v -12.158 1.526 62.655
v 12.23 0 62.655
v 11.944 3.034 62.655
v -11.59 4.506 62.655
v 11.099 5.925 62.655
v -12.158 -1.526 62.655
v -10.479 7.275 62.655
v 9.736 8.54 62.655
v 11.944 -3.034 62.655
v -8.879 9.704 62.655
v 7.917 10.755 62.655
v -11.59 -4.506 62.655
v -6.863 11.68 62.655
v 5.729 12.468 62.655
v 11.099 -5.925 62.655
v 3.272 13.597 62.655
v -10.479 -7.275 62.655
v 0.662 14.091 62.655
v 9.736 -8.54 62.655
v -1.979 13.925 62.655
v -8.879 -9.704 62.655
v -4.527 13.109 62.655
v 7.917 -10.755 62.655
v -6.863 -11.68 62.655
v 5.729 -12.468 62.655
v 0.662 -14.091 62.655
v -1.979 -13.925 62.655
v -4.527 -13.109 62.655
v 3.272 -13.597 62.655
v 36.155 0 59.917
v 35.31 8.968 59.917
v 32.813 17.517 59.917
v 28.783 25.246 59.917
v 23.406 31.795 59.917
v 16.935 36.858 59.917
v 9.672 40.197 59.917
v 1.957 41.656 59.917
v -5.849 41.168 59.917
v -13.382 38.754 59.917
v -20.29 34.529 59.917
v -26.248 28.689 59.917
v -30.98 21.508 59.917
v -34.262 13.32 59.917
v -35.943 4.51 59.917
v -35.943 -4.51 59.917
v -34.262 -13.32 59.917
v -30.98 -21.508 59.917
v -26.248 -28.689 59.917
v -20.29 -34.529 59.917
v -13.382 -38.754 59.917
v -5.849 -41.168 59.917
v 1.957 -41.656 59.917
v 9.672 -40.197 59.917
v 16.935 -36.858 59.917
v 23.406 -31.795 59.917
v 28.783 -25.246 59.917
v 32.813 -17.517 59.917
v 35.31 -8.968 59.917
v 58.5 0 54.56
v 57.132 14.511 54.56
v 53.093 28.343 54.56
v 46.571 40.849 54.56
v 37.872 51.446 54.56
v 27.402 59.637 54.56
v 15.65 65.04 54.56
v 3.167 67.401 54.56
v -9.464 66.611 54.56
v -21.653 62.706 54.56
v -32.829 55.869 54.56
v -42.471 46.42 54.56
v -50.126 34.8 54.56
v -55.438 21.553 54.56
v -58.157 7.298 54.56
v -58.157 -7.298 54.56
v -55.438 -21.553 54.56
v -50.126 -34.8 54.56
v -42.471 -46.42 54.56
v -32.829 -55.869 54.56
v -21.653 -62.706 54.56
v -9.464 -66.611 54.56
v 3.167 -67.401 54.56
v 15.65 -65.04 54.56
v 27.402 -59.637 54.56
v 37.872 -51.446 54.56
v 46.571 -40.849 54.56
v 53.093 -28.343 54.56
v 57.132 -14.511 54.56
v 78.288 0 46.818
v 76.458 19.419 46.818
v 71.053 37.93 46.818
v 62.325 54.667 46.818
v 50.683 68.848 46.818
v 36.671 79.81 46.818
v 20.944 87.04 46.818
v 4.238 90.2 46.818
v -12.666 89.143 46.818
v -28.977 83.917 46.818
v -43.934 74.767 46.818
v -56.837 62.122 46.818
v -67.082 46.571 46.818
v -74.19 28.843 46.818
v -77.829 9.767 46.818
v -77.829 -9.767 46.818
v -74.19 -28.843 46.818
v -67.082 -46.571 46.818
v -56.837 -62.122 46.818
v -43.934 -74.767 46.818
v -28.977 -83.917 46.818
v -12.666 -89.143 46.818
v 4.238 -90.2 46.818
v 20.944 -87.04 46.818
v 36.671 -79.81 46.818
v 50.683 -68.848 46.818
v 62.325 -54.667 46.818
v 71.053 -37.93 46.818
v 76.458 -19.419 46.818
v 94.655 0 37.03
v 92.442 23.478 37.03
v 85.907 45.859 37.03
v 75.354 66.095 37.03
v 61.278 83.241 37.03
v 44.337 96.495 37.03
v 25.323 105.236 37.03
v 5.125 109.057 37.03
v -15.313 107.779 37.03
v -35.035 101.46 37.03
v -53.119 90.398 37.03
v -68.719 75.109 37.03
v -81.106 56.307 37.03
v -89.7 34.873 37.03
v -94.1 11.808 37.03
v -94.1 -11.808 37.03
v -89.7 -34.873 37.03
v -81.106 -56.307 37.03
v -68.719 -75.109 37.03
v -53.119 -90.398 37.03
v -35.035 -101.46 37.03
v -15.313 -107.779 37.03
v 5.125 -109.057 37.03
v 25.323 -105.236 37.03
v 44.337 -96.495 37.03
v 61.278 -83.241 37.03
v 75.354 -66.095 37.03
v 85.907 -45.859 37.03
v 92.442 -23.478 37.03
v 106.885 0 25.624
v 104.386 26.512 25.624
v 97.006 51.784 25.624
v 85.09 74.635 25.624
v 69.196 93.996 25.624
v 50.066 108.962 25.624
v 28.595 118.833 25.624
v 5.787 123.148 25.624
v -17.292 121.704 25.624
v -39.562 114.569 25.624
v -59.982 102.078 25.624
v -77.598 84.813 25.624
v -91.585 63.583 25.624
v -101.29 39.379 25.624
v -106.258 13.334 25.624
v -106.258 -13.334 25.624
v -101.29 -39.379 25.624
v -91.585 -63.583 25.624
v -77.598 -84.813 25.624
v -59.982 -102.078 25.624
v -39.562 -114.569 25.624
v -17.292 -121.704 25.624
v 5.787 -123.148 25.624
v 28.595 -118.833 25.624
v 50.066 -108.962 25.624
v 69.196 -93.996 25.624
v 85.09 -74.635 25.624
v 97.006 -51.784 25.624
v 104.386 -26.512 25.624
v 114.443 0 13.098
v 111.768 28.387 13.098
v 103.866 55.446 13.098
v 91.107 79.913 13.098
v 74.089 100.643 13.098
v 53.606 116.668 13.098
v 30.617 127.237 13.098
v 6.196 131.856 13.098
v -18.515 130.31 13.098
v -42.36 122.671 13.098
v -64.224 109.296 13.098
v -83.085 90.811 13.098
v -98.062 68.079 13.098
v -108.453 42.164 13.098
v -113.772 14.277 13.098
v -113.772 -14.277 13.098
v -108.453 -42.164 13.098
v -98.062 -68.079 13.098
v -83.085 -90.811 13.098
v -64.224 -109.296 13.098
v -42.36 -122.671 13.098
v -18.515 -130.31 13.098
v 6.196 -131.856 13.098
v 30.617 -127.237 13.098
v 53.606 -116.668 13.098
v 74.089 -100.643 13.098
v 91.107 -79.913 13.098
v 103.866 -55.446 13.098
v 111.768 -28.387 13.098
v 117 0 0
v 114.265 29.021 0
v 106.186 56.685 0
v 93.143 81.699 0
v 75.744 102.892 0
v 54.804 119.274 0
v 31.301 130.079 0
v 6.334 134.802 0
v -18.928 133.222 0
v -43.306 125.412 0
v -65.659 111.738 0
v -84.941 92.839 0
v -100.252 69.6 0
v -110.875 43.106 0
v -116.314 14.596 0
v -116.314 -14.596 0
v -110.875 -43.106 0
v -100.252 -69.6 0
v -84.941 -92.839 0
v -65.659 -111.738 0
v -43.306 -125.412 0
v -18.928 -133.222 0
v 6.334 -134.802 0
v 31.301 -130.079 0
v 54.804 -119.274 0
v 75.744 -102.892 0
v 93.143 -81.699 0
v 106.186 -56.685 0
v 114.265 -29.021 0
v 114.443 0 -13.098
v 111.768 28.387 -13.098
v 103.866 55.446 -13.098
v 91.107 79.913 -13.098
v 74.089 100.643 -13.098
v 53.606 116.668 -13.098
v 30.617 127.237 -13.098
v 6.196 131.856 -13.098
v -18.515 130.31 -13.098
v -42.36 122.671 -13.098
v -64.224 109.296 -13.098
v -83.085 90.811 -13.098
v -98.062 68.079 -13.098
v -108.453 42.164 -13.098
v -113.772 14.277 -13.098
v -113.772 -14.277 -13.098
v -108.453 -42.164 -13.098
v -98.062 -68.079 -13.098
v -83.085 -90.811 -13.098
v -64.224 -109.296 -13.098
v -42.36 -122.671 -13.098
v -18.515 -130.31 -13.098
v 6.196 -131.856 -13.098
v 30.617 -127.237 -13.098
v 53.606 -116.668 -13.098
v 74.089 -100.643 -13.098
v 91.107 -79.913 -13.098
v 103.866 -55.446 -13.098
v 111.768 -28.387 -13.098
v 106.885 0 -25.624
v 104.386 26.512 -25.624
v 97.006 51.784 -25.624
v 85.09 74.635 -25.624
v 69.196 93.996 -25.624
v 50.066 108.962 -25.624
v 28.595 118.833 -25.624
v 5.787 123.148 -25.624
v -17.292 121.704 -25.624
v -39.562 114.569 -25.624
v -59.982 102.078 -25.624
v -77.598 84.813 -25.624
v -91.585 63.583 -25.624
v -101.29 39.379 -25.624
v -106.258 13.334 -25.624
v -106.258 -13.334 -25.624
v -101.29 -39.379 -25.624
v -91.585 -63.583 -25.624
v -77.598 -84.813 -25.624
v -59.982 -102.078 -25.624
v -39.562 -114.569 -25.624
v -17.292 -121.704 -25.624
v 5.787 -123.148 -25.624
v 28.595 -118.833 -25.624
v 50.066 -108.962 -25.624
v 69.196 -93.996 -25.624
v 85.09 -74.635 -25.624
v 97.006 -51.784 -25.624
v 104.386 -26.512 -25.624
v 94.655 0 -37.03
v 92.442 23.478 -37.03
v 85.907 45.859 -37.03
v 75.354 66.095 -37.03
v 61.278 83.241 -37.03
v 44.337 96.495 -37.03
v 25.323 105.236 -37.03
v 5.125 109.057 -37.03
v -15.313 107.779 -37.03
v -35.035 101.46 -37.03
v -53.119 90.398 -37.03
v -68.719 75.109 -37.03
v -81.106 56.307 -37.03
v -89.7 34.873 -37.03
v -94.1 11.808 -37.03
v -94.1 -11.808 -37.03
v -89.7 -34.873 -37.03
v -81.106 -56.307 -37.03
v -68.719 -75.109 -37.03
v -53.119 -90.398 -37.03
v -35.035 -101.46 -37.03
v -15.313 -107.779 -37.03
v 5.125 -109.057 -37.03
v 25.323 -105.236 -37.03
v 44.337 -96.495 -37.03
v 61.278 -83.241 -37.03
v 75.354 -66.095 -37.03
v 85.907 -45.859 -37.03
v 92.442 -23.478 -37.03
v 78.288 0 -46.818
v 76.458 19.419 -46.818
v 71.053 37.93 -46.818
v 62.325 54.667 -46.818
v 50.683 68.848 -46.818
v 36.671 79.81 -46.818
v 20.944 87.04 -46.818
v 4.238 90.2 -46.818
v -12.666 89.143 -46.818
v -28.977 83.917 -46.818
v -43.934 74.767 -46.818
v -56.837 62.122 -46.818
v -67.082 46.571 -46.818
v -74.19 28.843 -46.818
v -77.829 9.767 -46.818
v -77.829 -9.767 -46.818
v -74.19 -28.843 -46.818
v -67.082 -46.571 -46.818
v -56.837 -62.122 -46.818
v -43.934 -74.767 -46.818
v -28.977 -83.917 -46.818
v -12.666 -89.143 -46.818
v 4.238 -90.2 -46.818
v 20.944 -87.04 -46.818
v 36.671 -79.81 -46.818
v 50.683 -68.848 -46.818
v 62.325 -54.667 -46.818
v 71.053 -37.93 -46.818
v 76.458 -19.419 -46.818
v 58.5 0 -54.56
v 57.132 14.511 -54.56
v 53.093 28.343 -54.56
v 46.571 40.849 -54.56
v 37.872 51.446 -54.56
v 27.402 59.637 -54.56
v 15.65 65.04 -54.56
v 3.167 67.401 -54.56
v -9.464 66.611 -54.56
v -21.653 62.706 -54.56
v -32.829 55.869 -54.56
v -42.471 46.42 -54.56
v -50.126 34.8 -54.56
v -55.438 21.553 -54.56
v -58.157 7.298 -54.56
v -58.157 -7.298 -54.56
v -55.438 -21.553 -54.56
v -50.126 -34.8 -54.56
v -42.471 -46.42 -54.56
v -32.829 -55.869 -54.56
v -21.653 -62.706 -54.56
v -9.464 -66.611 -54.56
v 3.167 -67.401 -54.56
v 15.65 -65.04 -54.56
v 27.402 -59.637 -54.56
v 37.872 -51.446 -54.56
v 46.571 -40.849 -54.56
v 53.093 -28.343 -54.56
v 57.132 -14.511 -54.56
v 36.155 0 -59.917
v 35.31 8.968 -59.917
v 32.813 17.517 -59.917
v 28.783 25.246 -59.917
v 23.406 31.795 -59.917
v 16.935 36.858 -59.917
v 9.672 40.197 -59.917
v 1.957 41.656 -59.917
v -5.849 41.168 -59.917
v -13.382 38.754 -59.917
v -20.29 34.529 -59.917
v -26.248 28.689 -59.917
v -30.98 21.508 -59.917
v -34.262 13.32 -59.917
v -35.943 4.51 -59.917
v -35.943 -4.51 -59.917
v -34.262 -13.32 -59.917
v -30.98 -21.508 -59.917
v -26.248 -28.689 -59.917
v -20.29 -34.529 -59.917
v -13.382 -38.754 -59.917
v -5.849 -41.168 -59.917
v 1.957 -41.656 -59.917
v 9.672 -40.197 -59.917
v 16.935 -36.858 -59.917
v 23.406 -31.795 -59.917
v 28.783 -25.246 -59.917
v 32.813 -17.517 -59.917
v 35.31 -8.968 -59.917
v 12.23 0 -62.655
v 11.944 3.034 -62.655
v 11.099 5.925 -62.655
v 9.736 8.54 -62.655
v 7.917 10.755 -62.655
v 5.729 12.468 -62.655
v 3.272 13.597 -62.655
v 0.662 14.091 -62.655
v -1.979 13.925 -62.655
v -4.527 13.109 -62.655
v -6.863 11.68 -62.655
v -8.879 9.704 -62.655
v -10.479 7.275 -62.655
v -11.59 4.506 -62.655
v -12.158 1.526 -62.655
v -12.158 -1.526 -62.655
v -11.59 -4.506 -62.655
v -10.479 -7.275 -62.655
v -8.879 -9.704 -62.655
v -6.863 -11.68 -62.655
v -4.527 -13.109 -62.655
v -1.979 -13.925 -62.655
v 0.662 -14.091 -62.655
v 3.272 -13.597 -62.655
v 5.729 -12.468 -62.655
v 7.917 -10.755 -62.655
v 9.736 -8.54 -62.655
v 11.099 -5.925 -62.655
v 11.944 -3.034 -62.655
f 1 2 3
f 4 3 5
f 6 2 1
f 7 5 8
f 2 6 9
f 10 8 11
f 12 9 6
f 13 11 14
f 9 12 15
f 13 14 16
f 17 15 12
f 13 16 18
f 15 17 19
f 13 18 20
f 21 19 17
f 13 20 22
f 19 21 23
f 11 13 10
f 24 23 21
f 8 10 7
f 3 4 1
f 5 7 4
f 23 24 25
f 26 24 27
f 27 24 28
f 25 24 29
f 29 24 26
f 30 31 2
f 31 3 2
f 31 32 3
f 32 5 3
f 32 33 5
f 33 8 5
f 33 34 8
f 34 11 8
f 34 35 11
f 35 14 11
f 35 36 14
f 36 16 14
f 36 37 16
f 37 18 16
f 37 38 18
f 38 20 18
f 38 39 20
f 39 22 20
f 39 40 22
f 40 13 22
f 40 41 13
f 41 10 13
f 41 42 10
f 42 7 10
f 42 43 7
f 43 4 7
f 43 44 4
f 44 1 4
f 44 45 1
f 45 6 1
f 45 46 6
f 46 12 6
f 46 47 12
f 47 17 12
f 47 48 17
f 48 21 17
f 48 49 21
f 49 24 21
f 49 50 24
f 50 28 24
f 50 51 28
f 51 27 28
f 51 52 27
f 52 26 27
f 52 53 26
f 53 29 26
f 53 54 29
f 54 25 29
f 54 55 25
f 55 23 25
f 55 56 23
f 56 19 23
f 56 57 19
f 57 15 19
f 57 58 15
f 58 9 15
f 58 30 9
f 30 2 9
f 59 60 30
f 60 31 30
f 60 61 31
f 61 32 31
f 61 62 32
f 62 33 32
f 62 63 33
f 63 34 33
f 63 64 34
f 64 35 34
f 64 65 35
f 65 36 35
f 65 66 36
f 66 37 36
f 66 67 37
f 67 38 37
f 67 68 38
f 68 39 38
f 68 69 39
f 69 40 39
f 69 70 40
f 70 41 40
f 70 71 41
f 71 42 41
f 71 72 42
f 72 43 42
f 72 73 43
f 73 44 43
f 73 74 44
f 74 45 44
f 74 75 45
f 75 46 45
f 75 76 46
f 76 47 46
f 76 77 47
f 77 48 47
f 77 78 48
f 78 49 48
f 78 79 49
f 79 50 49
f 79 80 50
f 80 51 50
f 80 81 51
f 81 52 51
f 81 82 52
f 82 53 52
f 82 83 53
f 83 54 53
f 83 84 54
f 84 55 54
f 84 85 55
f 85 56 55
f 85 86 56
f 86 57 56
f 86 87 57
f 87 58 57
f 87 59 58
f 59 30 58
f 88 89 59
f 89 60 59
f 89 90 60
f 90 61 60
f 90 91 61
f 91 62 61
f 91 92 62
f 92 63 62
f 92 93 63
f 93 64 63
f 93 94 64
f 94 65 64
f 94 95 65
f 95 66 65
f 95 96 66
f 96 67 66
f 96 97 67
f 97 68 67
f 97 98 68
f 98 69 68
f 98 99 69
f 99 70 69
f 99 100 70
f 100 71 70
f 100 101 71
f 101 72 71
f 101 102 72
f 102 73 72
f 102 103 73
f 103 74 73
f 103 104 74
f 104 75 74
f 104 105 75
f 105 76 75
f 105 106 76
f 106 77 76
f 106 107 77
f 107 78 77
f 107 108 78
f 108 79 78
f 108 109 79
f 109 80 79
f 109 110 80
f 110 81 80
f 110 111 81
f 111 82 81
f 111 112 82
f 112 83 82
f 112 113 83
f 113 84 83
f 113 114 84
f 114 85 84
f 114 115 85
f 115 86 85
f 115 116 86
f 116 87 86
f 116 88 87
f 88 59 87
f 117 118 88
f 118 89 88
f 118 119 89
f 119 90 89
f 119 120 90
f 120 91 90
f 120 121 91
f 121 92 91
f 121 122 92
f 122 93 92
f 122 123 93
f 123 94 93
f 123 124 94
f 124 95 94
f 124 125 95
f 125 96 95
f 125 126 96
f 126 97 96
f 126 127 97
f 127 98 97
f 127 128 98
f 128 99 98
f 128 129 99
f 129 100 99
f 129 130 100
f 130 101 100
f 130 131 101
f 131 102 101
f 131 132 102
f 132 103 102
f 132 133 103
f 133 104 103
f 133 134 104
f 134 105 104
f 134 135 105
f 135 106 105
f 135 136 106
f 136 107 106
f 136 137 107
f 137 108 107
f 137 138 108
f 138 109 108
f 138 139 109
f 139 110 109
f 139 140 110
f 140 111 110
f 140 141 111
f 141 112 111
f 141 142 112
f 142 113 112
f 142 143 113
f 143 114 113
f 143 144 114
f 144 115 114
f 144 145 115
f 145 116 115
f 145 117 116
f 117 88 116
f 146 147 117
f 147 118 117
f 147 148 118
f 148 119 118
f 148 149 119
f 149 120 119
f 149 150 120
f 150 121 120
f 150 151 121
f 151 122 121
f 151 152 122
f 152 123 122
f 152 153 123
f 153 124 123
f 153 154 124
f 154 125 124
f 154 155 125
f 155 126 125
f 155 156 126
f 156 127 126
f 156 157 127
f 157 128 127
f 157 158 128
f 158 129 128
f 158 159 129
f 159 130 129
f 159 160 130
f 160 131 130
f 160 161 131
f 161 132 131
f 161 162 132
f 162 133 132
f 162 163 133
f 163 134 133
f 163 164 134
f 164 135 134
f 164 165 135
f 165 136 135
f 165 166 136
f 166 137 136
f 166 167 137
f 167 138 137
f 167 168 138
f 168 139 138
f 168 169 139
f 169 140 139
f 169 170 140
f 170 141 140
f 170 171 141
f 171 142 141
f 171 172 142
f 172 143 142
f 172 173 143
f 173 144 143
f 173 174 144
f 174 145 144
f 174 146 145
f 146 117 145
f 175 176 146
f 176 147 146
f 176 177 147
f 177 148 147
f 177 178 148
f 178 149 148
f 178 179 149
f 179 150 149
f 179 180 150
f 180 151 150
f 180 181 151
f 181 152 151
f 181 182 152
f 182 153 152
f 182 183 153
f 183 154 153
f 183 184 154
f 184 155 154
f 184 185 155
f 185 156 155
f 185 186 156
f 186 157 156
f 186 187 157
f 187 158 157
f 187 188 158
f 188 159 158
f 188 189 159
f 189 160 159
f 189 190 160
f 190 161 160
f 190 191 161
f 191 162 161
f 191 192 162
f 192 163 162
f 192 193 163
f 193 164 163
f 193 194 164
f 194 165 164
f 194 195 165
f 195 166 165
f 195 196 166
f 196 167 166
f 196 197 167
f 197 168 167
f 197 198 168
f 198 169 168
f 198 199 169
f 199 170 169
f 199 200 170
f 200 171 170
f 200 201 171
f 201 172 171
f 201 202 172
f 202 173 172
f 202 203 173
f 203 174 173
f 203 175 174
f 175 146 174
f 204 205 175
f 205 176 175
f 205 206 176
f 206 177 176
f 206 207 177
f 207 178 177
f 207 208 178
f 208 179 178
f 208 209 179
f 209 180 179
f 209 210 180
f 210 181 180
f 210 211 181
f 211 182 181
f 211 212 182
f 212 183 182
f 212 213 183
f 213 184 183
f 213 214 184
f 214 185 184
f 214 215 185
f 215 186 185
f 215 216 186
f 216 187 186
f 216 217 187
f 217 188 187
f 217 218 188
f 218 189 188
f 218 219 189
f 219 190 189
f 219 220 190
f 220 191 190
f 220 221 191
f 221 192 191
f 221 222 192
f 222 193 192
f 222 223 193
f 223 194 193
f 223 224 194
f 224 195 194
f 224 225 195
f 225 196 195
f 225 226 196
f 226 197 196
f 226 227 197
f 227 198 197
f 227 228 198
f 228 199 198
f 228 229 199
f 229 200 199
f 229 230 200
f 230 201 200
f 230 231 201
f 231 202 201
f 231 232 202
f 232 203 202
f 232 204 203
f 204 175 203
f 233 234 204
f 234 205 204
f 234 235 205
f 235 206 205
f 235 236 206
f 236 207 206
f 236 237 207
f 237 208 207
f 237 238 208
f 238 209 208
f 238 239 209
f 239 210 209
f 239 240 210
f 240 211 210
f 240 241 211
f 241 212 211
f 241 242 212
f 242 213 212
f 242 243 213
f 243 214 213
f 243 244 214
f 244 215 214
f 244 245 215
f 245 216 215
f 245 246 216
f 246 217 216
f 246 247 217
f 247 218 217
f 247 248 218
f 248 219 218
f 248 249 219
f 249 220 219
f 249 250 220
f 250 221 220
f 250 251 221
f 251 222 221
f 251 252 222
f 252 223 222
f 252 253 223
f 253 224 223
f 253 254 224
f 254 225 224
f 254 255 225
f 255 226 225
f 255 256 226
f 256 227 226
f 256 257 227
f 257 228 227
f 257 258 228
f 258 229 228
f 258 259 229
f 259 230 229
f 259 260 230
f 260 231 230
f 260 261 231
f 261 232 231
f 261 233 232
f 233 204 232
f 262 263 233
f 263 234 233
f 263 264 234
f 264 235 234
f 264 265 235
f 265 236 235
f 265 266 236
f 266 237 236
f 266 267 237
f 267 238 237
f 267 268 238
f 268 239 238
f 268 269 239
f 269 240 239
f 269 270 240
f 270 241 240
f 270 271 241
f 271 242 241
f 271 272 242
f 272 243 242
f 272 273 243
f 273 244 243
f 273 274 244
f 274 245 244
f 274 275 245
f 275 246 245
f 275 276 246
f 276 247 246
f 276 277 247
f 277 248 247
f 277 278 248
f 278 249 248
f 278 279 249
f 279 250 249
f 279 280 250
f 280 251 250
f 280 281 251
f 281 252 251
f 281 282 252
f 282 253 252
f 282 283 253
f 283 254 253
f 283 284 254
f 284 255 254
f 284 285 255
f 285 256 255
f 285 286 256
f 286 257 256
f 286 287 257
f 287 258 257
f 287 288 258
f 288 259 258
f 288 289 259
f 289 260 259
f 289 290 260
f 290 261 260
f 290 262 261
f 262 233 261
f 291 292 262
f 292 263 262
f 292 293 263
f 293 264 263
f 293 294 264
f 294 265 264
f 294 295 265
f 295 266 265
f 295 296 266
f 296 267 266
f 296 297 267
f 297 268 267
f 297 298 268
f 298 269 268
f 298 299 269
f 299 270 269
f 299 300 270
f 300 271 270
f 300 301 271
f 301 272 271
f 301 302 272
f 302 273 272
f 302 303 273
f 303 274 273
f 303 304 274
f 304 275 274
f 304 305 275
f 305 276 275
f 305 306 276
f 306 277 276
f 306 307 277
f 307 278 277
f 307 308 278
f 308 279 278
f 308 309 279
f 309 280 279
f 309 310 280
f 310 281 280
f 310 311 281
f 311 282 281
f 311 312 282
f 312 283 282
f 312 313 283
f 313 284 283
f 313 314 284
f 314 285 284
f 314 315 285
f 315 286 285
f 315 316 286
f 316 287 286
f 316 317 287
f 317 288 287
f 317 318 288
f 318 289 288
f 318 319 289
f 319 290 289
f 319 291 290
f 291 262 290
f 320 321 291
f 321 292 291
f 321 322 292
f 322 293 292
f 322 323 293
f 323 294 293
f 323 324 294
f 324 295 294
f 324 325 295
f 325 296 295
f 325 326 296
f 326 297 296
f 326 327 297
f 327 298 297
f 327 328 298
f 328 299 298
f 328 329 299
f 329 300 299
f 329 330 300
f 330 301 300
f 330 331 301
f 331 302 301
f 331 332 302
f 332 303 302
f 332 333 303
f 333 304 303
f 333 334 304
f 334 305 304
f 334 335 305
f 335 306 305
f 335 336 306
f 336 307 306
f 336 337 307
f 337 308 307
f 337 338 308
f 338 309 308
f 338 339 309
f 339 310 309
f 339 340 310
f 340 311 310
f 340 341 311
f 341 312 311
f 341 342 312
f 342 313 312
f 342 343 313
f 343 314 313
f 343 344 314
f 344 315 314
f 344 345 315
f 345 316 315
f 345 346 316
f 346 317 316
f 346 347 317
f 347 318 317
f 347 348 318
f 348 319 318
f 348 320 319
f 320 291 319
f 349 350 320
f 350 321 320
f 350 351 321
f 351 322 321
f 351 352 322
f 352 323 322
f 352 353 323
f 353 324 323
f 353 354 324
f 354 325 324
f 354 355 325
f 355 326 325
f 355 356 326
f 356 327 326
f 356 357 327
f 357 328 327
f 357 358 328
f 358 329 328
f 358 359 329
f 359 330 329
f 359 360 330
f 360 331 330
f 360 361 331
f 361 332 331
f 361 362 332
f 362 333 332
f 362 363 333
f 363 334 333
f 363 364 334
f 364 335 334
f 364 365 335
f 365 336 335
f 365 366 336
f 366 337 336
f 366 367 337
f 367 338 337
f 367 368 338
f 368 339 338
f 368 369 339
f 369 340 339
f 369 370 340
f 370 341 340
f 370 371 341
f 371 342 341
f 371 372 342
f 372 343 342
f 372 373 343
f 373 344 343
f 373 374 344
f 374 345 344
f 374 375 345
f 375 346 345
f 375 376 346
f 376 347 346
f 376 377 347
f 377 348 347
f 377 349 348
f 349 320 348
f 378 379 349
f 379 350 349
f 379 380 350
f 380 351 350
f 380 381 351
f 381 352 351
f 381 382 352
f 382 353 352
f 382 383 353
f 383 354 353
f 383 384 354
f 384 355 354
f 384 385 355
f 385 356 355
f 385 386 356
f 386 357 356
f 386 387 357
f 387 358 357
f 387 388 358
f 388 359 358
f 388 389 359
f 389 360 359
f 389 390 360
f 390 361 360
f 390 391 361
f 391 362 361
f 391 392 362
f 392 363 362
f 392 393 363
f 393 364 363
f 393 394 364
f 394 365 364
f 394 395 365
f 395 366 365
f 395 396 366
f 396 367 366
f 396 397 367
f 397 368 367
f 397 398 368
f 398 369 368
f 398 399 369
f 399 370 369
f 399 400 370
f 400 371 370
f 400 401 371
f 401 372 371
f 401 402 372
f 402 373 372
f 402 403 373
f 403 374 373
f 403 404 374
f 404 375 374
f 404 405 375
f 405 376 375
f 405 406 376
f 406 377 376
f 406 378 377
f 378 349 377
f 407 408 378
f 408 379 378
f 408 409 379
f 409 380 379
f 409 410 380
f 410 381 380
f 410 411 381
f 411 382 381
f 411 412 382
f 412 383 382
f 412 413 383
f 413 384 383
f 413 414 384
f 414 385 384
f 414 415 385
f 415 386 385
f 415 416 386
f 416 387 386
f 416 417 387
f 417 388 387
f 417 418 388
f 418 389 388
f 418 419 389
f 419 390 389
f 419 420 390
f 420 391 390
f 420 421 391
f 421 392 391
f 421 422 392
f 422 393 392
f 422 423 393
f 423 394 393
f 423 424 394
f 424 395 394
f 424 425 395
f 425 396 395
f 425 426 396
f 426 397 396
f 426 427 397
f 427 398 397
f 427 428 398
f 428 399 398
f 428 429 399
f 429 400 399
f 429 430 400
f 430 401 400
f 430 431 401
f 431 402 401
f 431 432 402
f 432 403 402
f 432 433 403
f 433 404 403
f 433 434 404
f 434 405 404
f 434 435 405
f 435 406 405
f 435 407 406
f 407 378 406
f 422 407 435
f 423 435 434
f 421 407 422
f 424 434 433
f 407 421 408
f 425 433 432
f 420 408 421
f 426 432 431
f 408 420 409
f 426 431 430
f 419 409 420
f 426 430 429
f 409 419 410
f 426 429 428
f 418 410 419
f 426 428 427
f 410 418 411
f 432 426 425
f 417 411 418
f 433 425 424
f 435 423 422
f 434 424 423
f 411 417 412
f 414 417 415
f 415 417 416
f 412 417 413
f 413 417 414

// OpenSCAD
// Generated by SolidPython 1.0.1 on 2020-07-29 00:46:51


scale(v = [13, 15, 7]) {
	sphere(r = 9);
}
/***********************************************
*********      SolidPython code:      **********
************************************************
 
# import packages: SolidPython
from solid import *
from solid.utils import *
from itertools import chain, combinations, permutations


class Resize:

    def __init__(self, scad_file):
        self.scad_file = scad_file
        #self.scad_file = import_scad(scad_file)
        # cone/cylinder param:
        self.r1 = 0
        self.r2 = 0
        self.h = 0
        # rectangular prism param:
        self.w = 0
        self.l = 0
        # ellipse param:
        self.r = 0

    # import OpenScad code (file name corresponds to shape)


    # classify shape + parameters
    def assign(self, param1, param2, param3):
        if self.scad_file == 'cone.scad':
            self.r1 = param1
            self.r2 = param2
            self.h = param3
        elif self.scad_file == 'cylinder.scad':
            self.r1 = param1
            self.r2 = param2
            self.h = param3
        elif self.scad_file == 'rectangularPrism.scad':
            self.h = param1
            self.l = param2
            self.w = param3
        else:
            self.r = param1
            self.h = param2

    # resize parameters
    def iterate(self):
        x = range(3, 20, 2)
        i = 1
        if self.scad_file == 'cone.scad':
            tempList = list(permutations(x, 2))
            for temp in tempList:
                param1 = temp[0]
                param2 = temp[1]
                filepath = 'produced_scad_files/' + 'cone' + str(param1) + '_' + str(param2) + '_' + '.scad'
                scad_render_to_file(cylinder(h=param1, r1=param2, r2=0), filepath)

        elif self.scad_file == 'cylinder.scad':
            tempList = list(permutations(x, 3))
            for temp in tempList:
                param1 = temp[0]
                param2 = temp[1]
                filepath = 'produced_scad_files/' + 'cylinder' + str(param1) + '_' + str(param2) + '_' + '.scad'
                scad_render_to_file(cylinder(h=param1, r1=param2, r2=param2), filepath)

        elif self.scad_file == 'rectangularPrism.scad':
            tempList = list(permutations(x, 3))
            for temp in tempList:
                param1 = temp[0]
                param2 = temp[1]
                param3 = temp[2]
                filepath = 'produced_scad_files/' + 'rectangularPrism' + str(param1) + '_' + str(param2) + '_' + str(
                    param3) + '.scad'
                scad_render_to_file(cube(size=(param1, param2, param3)), filepath)

        elif self.scad_file == 'ellipse.scad':
            tempList = list(permutations(x, 4))
            for temp in tempList:
                param1 = temp[0]
                param2 = temp[1]
                param3 = temp[2]
                param4 = temp[3]
                filepath = 'produced_scad_files/' + 'ellipse' + str(param1) + '_' + str(param2) + '_' + str(param3) + '_' + str(param4) + '.scad'
                scad_render_to_file(scale([param1, param2, param3])(sphere(r=param4)), filepath)

    def render_to_scadfile(self):
        scad_render_to_file(scad, 'example.scad') 
 
************************************************/
